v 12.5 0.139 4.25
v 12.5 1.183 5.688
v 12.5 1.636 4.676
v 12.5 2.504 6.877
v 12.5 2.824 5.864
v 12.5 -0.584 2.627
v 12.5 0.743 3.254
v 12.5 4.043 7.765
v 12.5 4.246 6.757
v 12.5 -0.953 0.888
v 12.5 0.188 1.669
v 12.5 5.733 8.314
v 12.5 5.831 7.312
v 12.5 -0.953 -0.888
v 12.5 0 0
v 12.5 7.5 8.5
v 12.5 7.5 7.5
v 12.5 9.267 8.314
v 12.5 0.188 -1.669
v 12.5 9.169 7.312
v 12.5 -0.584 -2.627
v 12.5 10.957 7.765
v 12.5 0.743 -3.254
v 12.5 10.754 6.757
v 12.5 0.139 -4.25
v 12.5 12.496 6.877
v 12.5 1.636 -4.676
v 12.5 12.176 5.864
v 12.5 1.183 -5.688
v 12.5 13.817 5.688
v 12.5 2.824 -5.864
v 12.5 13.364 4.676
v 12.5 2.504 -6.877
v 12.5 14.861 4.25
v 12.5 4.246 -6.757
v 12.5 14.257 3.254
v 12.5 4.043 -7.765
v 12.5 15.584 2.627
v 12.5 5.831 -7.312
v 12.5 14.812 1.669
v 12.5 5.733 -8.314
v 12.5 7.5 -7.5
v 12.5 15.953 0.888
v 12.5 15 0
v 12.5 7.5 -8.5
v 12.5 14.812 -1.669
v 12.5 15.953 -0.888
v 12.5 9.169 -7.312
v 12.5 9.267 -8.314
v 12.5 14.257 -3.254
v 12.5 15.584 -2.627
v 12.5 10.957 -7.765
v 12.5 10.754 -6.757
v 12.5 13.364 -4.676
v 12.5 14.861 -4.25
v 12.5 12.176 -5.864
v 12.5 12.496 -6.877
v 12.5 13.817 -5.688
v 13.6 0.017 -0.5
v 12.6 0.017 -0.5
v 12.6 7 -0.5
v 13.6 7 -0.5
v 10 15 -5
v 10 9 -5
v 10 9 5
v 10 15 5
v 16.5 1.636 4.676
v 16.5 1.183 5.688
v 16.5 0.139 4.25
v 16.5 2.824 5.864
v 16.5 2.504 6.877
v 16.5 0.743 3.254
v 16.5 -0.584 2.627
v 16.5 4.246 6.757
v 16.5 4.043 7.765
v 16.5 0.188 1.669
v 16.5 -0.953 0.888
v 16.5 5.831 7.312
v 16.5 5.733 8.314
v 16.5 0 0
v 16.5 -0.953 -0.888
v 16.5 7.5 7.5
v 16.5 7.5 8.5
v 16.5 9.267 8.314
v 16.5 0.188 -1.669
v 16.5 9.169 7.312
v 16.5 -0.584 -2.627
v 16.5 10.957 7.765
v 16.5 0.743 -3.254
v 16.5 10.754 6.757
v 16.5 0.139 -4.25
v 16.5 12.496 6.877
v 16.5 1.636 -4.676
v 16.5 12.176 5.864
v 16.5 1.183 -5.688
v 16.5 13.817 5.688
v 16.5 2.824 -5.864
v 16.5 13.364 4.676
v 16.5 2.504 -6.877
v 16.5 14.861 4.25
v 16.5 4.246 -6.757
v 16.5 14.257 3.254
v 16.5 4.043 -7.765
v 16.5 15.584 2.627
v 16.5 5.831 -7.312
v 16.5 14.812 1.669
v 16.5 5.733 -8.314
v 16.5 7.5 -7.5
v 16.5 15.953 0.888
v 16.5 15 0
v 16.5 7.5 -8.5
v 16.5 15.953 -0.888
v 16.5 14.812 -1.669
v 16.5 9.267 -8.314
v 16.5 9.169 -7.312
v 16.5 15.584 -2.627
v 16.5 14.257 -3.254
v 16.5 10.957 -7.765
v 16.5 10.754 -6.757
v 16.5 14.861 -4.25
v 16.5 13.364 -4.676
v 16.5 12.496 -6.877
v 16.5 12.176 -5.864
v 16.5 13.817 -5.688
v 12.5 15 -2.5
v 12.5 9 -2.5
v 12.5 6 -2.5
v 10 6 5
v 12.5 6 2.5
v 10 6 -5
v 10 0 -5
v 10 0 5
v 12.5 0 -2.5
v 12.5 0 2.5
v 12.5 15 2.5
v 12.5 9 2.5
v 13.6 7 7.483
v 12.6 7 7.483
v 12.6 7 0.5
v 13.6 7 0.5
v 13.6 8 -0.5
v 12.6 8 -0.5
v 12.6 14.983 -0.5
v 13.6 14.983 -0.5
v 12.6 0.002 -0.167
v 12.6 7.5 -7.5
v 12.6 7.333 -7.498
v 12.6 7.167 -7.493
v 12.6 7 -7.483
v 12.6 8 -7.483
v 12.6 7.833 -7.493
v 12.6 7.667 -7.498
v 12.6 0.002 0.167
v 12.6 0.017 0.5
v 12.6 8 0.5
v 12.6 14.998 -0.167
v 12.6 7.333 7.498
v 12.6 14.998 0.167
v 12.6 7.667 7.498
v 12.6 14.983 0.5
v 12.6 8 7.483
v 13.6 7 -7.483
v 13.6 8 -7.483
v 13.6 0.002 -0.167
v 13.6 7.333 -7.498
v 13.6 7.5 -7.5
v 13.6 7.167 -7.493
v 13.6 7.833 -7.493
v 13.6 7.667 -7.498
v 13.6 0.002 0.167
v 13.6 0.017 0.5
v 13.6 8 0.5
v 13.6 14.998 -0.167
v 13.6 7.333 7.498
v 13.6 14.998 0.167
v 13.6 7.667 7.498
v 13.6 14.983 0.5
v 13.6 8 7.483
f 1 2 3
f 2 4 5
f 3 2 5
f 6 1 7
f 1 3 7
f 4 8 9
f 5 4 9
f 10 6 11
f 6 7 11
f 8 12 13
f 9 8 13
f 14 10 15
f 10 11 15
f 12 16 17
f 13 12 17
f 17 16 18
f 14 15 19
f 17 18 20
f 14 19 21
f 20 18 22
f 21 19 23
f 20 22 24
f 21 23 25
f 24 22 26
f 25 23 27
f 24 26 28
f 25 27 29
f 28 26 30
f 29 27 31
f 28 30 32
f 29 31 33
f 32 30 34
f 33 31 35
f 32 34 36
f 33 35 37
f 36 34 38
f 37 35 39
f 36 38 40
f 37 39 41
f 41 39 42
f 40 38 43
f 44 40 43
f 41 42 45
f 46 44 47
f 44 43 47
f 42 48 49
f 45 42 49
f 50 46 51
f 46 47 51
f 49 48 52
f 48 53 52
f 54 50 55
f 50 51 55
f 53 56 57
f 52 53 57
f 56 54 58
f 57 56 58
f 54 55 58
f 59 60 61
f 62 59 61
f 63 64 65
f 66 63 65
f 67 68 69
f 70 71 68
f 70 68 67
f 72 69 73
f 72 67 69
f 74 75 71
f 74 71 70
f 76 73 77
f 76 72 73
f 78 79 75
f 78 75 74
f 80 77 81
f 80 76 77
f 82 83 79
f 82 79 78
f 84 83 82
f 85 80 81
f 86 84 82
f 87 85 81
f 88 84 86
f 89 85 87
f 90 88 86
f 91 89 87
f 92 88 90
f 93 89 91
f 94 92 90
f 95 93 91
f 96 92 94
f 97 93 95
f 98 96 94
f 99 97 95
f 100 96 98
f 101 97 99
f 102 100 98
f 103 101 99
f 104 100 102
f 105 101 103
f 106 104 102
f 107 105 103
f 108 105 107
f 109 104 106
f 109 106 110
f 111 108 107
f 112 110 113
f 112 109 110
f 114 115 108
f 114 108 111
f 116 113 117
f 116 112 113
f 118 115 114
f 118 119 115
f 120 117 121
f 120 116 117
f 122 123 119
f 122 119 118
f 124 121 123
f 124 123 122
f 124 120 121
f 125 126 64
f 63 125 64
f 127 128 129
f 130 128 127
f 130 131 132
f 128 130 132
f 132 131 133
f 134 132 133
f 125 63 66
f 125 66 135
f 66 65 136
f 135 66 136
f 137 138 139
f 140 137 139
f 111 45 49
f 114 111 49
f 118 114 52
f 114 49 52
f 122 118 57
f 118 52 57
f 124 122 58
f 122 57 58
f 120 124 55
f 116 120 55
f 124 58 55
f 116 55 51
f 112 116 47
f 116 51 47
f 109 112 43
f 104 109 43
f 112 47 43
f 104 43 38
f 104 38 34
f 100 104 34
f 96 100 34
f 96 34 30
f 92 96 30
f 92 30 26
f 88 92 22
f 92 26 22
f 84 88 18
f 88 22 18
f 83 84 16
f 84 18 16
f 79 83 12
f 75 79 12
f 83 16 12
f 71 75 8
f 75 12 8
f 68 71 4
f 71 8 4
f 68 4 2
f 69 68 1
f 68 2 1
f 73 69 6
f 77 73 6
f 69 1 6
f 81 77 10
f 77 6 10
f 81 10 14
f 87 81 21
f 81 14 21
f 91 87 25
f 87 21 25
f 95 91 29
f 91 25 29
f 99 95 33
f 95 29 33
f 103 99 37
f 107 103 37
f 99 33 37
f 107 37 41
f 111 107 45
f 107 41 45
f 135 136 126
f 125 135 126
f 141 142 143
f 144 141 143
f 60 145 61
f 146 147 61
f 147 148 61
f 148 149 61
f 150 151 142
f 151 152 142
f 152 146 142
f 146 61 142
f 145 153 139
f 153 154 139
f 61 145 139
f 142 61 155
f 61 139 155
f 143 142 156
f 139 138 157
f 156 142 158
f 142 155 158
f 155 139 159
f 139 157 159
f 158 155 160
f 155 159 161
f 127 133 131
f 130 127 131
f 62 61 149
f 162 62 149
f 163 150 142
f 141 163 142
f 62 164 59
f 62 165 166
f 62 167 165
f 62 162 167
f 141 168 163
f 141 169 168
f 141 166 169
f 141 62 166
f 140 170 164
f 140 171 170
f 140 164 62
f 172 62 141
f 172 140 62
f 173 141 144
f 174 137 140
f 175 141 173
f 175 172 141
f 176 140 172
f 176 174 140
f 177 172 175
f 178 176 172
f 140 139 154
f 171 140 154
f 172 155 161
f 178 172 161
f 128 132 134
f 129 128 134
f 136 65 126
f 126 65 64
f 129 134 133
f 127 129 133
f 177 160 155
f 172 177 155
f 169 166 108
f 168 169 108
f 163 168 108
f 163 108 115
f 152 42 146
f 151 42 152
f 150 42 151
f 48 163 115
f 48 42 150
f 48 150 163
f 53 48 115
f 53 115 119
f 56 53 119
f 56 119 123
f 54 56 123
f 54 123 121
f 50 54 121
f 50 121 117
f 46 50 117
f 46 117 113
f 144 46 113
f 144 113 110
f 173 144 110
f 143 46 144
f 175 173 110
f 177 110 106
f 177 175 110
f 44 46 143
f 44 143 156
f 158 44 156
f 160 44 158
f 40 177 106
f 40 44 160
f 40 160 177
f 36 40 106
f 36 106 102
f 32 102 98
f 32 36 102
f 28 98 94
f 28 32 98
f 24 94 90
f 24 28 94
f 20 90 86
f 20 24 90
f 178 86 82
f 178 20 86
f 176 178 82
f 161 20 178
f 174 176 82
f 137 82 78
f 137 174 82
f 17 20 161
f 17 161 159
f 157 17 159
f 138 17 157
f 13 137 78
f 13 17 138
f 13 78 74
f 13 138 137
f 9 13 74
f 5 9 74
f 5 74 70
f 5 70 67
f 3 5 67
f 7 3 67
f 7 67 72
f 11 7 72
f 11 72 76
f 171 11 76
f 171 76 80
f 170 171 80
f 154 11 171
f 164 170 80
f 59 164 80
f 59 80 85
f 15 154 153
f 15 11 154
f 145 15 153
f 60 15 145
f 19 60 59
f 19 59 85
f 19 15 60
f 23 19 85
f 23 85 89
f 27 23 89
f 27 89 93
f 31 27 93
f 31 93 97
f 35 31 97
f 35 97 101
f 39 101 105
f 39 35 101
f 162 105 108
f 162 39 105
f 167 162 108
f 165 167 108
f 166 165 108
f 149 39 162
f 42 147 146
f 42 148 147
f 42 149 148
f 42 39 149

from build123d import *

# Parameters (mm, degrees)
BOSS_EXTRUDE1_DEPTH     = 15
SKETCH4_R               = 8.5
SKETCH4_R_2             = 7.5
EXTRUDE_THIN1_DEPTH     = 4
EXTRUDE_THIN5_START     = 0.1
EXTRUDE_THIN5_DEPTH     = 1
CIRPATTERN2_COUNT       = 4
CUT_EXTRUDE2_DEPTH      = 25.50510151
CUT_EXTRUDE2_DEPTH_BACK = 25.50510151
SKETCH9_W               = 5
SKETCH9_H               = 3


with BuildPart() as part:
    # Sketch3 → Boss-Extrude1 (new body)
    with BuildSketch(Plane(origin=(0, 0, 0), x_dir=(1, 0, 0), z_dir=(0, 1, 0))):
        Polygon((10, 5), (10, -5), (12.5, -2.5), (12.5, 2.5), align=None)
    extrude(amount=BOSS_EXTRUDE1_DEPTH)

    # Sketch9 → Cut-Extrude2 (cut, two sides: drawn at the far end of the back side and taken through both)
    with BuildSketch(Plane.XY.offset(-CUT_EXTRUDE2_DEPTH_BACK)):
        with Locations((10, 7.5)):
            Rectangle(SKETCH9_W, SKETCH9_H)
    extrude(amount=CUT_EXTRUDE2_DEPTH + CUT_EXTRUDE2_DEPTH_BACK, mode=Mode.SUBTRACT)


with BuildPart() as body_2:
    # Sketch4 → Extrude-Thin1 (new body)
    with BuildSketch(Plane(origin=(12.5, 0, 0), x_dir=(0, 0, -1), z_dir=(1, 0, 0))):
        with Locations((0, 7.5)):
            Circle(SKETCH4_R)
        with Locations((0, 7.5)):
            Circle(SKETCH4_R_2, mode=Mode.SUBTRACT)
    extrude(amount=EXTRUDE_THIN1_DEPTH)

    # Sketch7 → Extrude-Thin5 (add)
    with BuildSketch(Plane(origin=(12.5, 0, 0), x_dir=(0, 0, -1), z_dir=(1, 0, 0)).offset(EXTRUDE_THIN5_START)):
        Polygon((-8.036394857, 7), (0, 7), (8.036394857, 7), (8.036394857, 8), (0, 8), (-8.036394857, 8), align=None)
    extrude_thin5 = extrude(amount=EXTRUDE_THIN5_DEPTH)

    # CirPattern2: Extrude-Thin5 ×4 about axis
    cirpattern2_axis = Axis((16.5, 7.5, 0), (1, 0, 0))
    for i in range(1, CIRPATTERN2_COUNT):
        add(extrude_thin5.rotate(cirpattern2_axis, i * 360 / CIRPATTERN2_COUNT))


with BuildPart() as cut_extrude2_piece_1:
    # of the separate pieces the step leaves, piece 1, a body of its own (cut_extrude2_pieces)
    add(part.part.solids().sort_by_distance((10, 0, -5))[0])


with BuildPart() as cut_extrude2_piece_2:
    # of the separate pieces the step leaves, piece 2, a body of its own (cut_extrude2_pieces)
    add(part.part.solids().sort_by_distance((10, 9, -5))[0])


solid = Compound([body_2.part, cut_extrude2_piece_1.part, cut_extrude2_piece_2.part])
